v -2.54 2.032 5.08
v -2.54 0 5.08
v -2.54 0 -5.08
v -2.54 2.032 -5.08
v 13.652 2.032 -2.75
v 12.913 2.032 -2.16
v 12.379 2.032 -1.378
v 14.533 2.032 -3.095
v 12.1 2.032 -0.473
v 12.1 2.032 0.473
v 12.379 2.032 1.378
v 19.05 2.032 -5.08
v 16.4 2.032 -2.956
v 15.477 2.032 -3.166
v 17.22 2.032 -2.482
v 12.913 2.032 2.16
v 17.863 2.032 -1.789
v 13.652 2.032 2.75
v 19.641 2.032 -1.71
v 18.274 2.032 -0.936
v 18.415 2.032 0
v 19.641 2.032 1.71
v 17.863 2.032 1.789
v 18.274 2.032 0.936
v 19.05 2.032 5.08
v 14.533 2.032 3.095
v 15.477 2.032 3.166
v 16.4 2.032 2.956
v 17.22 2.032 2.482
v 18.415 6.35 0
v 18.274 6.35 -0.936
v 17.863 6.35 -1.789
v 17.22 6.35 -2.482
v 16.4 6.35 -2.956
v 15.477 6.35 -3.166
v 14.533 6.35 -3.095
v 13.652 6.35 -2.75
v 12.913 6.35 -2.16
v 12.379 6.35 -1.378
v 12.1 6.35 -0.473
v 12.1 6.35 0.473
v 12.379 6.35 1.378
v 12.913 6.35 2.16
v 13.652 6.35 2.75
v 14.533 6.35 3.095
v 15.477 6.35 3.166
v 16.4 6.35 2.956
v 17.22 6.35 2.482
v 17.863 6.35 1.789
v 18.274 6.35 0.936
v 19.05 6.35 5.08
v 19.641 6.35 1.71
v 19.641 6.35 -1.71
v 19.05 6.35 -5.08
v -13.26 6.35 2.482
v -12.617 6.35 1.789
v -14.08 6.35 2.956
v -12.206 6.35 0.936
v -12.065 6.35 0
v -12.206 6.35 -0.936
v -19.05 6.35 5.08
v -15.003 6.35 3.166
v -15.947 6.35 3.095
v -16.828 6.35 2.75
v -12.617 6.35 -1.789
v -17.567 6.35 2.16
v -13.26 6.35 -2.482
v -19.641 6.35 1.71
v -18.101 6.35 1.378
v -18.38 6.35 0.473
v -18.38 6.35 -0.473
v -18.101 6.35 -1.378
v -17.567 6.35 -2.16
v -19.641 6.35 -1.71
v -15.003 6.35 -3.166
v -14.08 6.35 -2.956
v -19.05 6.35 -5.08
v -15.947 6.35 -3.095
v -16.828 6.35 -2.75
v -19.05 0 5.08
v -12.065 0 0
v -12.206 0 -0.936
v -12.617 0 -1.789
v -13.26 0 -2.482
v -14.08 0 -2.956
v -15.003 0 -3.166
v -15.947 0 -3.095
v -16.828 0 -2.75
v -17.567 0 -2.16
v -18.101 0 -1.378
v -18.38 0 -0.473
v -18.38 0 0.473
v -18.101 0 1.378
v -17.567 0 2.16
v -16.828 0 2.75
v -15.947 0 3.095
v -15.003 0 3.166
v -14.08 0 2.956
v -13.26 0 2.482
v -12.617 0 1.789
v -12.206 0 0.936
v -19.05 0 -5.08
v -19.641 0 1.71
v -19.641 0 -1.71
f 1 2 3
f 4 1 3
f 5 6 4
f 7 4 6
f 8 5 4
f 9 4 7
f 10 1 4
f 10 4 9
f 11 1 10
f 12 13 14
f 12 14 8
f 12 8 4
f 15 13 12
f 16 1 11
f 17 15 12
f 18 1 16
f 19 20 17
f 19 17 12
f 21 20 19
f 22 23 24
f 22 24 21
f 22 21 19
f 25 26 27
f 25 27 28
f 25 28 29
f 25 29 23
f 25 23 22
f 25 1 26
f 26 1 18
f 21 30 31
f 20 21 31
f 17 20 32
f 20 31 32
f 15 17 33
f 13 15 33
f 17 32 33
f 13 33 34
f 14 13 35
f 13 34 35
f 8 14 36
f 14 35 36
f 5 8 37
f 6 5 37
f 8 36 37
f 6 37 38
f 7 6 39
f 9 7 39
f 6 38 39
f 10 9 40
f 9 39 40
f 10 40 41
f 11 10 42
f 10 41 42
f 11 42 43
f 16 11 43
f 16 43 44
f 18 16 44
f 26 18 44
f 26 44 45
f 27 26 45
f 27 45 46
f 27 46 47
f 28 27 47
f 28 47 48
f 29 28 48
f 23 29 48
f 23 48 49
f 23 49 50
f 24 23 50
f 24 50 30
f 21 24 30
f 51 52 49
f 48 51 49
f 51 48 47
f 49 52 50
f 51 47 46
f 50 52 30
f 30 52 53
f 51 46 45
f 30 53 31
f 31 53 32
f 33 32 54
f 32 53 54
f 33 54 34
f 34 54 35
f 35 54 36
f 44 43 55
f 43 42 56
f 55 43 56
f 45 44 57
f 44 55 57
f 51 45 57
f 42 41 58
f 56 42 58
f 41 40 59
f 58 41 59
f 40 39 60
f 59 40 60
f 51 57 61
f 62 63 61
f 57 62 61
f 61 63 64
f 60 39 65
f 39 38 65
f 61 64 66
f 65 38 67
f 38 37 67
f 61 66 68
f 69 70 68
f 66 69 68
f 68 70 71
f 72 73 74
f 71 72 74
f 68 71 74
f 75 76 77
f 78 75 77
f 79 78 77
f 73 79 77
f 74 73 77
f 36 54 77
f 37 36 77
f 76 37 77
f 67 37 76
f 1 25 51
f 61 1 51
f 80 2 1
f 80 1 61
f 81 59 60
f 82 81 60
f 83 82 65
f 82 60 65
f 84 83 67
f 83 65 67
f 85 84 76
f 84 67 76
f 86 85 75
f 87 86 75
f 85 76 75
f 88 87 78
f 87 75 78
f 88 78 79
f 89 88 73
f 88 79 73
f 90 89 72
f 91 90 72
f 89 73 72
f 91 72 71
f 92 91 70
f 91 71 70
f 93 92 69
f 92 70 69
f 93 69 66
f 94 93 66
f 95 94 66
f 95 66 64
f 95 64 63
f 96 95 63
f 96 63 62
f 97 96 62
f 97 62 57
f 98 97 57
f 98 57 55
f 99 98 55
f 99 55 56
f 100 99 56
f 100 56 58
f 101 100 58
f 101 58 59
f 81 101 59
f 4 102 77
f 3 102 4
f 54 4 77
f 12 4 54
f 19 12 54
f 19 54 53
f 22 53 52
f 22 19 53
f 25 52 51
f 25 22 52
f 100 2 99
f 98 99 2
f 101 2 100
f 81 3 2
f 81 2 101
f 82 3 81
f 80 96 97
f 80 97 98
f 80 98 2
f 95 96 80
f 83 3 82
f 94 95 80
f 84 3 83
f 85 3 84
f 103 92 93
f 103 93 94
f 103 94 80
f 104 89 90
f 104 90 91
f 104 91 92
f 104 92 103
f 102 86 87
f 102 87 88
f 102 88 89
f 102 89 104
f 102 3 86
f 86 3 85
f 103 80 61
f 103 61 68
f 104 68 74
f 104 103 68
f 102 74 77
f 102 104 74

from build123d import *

# Parameters (mm, degrees)
BOSS_EXTRUDE2_DEPTH = 6.35
SKETCH4_R           = 3.175
CUT_EXTRUDE1_DEPTH  = 12.7
CUT_EXTRUDE2_DEPTH  = 2.032


with BuildPart() as part:
    # Sketch3 → Boss-Extrude2 (new body)
    with BuildSketch(Plane(origin=(0, 0, 0), x_dir=(1, 0, 0), z_dir=(0, 1, 0))):
        with BuildLine():
            Line((-19.05, 5.08), (19.05, 5.08))
            ThreePointArc((19.05, 5.08), (19.715701864, 0), (19.05, -5.08))
            Line((19.05, -5.08), (-19.05, -5.08))
            ThreePointArc((-19.05, -5.08), (-19.715701864, 0), (-19.05, 5.08))
        make_face()
    extrude(amount=BOSS_EXTRUDE2_DEPTH)

    # Sketch4 → Cut-Extrude1 (cut)
    with BuildSketch(Plane(origin=(0, 6.35, 0), x_dir=(1, 0, 0), z_dir=(0, 1, 0))):
        with Locations((15.24, 0)):
            Circle(SKETCH4_R)
        with Locations((-15.24, 0)):
            Circle(SKETCH4_R)
    extrude(amount=-CUT_EXTRUDE1_DEPTH, mode=Mode.SUBTRACT)

    # Sketch5 → Cut-Extrude2 (cut)
    with BuildSketch(Plane.XZ):
        with BuildLine():
            Line((19.05, 5.08), (-2.54, 5.08))
            Line((-2.54, 5.08), (-2.54, -5.08))
            Line((-2.54, -5.08), (19.05, -5.08))
            ThreePointArc((19.05, -5.08), (19.715701864, 0), (19.05, 5.08))
        make_face()
    extrude(amount=-CUT_EXTRUDE2_DEPTH, mode=Mode.SUBTRACT)


solid = part.part
